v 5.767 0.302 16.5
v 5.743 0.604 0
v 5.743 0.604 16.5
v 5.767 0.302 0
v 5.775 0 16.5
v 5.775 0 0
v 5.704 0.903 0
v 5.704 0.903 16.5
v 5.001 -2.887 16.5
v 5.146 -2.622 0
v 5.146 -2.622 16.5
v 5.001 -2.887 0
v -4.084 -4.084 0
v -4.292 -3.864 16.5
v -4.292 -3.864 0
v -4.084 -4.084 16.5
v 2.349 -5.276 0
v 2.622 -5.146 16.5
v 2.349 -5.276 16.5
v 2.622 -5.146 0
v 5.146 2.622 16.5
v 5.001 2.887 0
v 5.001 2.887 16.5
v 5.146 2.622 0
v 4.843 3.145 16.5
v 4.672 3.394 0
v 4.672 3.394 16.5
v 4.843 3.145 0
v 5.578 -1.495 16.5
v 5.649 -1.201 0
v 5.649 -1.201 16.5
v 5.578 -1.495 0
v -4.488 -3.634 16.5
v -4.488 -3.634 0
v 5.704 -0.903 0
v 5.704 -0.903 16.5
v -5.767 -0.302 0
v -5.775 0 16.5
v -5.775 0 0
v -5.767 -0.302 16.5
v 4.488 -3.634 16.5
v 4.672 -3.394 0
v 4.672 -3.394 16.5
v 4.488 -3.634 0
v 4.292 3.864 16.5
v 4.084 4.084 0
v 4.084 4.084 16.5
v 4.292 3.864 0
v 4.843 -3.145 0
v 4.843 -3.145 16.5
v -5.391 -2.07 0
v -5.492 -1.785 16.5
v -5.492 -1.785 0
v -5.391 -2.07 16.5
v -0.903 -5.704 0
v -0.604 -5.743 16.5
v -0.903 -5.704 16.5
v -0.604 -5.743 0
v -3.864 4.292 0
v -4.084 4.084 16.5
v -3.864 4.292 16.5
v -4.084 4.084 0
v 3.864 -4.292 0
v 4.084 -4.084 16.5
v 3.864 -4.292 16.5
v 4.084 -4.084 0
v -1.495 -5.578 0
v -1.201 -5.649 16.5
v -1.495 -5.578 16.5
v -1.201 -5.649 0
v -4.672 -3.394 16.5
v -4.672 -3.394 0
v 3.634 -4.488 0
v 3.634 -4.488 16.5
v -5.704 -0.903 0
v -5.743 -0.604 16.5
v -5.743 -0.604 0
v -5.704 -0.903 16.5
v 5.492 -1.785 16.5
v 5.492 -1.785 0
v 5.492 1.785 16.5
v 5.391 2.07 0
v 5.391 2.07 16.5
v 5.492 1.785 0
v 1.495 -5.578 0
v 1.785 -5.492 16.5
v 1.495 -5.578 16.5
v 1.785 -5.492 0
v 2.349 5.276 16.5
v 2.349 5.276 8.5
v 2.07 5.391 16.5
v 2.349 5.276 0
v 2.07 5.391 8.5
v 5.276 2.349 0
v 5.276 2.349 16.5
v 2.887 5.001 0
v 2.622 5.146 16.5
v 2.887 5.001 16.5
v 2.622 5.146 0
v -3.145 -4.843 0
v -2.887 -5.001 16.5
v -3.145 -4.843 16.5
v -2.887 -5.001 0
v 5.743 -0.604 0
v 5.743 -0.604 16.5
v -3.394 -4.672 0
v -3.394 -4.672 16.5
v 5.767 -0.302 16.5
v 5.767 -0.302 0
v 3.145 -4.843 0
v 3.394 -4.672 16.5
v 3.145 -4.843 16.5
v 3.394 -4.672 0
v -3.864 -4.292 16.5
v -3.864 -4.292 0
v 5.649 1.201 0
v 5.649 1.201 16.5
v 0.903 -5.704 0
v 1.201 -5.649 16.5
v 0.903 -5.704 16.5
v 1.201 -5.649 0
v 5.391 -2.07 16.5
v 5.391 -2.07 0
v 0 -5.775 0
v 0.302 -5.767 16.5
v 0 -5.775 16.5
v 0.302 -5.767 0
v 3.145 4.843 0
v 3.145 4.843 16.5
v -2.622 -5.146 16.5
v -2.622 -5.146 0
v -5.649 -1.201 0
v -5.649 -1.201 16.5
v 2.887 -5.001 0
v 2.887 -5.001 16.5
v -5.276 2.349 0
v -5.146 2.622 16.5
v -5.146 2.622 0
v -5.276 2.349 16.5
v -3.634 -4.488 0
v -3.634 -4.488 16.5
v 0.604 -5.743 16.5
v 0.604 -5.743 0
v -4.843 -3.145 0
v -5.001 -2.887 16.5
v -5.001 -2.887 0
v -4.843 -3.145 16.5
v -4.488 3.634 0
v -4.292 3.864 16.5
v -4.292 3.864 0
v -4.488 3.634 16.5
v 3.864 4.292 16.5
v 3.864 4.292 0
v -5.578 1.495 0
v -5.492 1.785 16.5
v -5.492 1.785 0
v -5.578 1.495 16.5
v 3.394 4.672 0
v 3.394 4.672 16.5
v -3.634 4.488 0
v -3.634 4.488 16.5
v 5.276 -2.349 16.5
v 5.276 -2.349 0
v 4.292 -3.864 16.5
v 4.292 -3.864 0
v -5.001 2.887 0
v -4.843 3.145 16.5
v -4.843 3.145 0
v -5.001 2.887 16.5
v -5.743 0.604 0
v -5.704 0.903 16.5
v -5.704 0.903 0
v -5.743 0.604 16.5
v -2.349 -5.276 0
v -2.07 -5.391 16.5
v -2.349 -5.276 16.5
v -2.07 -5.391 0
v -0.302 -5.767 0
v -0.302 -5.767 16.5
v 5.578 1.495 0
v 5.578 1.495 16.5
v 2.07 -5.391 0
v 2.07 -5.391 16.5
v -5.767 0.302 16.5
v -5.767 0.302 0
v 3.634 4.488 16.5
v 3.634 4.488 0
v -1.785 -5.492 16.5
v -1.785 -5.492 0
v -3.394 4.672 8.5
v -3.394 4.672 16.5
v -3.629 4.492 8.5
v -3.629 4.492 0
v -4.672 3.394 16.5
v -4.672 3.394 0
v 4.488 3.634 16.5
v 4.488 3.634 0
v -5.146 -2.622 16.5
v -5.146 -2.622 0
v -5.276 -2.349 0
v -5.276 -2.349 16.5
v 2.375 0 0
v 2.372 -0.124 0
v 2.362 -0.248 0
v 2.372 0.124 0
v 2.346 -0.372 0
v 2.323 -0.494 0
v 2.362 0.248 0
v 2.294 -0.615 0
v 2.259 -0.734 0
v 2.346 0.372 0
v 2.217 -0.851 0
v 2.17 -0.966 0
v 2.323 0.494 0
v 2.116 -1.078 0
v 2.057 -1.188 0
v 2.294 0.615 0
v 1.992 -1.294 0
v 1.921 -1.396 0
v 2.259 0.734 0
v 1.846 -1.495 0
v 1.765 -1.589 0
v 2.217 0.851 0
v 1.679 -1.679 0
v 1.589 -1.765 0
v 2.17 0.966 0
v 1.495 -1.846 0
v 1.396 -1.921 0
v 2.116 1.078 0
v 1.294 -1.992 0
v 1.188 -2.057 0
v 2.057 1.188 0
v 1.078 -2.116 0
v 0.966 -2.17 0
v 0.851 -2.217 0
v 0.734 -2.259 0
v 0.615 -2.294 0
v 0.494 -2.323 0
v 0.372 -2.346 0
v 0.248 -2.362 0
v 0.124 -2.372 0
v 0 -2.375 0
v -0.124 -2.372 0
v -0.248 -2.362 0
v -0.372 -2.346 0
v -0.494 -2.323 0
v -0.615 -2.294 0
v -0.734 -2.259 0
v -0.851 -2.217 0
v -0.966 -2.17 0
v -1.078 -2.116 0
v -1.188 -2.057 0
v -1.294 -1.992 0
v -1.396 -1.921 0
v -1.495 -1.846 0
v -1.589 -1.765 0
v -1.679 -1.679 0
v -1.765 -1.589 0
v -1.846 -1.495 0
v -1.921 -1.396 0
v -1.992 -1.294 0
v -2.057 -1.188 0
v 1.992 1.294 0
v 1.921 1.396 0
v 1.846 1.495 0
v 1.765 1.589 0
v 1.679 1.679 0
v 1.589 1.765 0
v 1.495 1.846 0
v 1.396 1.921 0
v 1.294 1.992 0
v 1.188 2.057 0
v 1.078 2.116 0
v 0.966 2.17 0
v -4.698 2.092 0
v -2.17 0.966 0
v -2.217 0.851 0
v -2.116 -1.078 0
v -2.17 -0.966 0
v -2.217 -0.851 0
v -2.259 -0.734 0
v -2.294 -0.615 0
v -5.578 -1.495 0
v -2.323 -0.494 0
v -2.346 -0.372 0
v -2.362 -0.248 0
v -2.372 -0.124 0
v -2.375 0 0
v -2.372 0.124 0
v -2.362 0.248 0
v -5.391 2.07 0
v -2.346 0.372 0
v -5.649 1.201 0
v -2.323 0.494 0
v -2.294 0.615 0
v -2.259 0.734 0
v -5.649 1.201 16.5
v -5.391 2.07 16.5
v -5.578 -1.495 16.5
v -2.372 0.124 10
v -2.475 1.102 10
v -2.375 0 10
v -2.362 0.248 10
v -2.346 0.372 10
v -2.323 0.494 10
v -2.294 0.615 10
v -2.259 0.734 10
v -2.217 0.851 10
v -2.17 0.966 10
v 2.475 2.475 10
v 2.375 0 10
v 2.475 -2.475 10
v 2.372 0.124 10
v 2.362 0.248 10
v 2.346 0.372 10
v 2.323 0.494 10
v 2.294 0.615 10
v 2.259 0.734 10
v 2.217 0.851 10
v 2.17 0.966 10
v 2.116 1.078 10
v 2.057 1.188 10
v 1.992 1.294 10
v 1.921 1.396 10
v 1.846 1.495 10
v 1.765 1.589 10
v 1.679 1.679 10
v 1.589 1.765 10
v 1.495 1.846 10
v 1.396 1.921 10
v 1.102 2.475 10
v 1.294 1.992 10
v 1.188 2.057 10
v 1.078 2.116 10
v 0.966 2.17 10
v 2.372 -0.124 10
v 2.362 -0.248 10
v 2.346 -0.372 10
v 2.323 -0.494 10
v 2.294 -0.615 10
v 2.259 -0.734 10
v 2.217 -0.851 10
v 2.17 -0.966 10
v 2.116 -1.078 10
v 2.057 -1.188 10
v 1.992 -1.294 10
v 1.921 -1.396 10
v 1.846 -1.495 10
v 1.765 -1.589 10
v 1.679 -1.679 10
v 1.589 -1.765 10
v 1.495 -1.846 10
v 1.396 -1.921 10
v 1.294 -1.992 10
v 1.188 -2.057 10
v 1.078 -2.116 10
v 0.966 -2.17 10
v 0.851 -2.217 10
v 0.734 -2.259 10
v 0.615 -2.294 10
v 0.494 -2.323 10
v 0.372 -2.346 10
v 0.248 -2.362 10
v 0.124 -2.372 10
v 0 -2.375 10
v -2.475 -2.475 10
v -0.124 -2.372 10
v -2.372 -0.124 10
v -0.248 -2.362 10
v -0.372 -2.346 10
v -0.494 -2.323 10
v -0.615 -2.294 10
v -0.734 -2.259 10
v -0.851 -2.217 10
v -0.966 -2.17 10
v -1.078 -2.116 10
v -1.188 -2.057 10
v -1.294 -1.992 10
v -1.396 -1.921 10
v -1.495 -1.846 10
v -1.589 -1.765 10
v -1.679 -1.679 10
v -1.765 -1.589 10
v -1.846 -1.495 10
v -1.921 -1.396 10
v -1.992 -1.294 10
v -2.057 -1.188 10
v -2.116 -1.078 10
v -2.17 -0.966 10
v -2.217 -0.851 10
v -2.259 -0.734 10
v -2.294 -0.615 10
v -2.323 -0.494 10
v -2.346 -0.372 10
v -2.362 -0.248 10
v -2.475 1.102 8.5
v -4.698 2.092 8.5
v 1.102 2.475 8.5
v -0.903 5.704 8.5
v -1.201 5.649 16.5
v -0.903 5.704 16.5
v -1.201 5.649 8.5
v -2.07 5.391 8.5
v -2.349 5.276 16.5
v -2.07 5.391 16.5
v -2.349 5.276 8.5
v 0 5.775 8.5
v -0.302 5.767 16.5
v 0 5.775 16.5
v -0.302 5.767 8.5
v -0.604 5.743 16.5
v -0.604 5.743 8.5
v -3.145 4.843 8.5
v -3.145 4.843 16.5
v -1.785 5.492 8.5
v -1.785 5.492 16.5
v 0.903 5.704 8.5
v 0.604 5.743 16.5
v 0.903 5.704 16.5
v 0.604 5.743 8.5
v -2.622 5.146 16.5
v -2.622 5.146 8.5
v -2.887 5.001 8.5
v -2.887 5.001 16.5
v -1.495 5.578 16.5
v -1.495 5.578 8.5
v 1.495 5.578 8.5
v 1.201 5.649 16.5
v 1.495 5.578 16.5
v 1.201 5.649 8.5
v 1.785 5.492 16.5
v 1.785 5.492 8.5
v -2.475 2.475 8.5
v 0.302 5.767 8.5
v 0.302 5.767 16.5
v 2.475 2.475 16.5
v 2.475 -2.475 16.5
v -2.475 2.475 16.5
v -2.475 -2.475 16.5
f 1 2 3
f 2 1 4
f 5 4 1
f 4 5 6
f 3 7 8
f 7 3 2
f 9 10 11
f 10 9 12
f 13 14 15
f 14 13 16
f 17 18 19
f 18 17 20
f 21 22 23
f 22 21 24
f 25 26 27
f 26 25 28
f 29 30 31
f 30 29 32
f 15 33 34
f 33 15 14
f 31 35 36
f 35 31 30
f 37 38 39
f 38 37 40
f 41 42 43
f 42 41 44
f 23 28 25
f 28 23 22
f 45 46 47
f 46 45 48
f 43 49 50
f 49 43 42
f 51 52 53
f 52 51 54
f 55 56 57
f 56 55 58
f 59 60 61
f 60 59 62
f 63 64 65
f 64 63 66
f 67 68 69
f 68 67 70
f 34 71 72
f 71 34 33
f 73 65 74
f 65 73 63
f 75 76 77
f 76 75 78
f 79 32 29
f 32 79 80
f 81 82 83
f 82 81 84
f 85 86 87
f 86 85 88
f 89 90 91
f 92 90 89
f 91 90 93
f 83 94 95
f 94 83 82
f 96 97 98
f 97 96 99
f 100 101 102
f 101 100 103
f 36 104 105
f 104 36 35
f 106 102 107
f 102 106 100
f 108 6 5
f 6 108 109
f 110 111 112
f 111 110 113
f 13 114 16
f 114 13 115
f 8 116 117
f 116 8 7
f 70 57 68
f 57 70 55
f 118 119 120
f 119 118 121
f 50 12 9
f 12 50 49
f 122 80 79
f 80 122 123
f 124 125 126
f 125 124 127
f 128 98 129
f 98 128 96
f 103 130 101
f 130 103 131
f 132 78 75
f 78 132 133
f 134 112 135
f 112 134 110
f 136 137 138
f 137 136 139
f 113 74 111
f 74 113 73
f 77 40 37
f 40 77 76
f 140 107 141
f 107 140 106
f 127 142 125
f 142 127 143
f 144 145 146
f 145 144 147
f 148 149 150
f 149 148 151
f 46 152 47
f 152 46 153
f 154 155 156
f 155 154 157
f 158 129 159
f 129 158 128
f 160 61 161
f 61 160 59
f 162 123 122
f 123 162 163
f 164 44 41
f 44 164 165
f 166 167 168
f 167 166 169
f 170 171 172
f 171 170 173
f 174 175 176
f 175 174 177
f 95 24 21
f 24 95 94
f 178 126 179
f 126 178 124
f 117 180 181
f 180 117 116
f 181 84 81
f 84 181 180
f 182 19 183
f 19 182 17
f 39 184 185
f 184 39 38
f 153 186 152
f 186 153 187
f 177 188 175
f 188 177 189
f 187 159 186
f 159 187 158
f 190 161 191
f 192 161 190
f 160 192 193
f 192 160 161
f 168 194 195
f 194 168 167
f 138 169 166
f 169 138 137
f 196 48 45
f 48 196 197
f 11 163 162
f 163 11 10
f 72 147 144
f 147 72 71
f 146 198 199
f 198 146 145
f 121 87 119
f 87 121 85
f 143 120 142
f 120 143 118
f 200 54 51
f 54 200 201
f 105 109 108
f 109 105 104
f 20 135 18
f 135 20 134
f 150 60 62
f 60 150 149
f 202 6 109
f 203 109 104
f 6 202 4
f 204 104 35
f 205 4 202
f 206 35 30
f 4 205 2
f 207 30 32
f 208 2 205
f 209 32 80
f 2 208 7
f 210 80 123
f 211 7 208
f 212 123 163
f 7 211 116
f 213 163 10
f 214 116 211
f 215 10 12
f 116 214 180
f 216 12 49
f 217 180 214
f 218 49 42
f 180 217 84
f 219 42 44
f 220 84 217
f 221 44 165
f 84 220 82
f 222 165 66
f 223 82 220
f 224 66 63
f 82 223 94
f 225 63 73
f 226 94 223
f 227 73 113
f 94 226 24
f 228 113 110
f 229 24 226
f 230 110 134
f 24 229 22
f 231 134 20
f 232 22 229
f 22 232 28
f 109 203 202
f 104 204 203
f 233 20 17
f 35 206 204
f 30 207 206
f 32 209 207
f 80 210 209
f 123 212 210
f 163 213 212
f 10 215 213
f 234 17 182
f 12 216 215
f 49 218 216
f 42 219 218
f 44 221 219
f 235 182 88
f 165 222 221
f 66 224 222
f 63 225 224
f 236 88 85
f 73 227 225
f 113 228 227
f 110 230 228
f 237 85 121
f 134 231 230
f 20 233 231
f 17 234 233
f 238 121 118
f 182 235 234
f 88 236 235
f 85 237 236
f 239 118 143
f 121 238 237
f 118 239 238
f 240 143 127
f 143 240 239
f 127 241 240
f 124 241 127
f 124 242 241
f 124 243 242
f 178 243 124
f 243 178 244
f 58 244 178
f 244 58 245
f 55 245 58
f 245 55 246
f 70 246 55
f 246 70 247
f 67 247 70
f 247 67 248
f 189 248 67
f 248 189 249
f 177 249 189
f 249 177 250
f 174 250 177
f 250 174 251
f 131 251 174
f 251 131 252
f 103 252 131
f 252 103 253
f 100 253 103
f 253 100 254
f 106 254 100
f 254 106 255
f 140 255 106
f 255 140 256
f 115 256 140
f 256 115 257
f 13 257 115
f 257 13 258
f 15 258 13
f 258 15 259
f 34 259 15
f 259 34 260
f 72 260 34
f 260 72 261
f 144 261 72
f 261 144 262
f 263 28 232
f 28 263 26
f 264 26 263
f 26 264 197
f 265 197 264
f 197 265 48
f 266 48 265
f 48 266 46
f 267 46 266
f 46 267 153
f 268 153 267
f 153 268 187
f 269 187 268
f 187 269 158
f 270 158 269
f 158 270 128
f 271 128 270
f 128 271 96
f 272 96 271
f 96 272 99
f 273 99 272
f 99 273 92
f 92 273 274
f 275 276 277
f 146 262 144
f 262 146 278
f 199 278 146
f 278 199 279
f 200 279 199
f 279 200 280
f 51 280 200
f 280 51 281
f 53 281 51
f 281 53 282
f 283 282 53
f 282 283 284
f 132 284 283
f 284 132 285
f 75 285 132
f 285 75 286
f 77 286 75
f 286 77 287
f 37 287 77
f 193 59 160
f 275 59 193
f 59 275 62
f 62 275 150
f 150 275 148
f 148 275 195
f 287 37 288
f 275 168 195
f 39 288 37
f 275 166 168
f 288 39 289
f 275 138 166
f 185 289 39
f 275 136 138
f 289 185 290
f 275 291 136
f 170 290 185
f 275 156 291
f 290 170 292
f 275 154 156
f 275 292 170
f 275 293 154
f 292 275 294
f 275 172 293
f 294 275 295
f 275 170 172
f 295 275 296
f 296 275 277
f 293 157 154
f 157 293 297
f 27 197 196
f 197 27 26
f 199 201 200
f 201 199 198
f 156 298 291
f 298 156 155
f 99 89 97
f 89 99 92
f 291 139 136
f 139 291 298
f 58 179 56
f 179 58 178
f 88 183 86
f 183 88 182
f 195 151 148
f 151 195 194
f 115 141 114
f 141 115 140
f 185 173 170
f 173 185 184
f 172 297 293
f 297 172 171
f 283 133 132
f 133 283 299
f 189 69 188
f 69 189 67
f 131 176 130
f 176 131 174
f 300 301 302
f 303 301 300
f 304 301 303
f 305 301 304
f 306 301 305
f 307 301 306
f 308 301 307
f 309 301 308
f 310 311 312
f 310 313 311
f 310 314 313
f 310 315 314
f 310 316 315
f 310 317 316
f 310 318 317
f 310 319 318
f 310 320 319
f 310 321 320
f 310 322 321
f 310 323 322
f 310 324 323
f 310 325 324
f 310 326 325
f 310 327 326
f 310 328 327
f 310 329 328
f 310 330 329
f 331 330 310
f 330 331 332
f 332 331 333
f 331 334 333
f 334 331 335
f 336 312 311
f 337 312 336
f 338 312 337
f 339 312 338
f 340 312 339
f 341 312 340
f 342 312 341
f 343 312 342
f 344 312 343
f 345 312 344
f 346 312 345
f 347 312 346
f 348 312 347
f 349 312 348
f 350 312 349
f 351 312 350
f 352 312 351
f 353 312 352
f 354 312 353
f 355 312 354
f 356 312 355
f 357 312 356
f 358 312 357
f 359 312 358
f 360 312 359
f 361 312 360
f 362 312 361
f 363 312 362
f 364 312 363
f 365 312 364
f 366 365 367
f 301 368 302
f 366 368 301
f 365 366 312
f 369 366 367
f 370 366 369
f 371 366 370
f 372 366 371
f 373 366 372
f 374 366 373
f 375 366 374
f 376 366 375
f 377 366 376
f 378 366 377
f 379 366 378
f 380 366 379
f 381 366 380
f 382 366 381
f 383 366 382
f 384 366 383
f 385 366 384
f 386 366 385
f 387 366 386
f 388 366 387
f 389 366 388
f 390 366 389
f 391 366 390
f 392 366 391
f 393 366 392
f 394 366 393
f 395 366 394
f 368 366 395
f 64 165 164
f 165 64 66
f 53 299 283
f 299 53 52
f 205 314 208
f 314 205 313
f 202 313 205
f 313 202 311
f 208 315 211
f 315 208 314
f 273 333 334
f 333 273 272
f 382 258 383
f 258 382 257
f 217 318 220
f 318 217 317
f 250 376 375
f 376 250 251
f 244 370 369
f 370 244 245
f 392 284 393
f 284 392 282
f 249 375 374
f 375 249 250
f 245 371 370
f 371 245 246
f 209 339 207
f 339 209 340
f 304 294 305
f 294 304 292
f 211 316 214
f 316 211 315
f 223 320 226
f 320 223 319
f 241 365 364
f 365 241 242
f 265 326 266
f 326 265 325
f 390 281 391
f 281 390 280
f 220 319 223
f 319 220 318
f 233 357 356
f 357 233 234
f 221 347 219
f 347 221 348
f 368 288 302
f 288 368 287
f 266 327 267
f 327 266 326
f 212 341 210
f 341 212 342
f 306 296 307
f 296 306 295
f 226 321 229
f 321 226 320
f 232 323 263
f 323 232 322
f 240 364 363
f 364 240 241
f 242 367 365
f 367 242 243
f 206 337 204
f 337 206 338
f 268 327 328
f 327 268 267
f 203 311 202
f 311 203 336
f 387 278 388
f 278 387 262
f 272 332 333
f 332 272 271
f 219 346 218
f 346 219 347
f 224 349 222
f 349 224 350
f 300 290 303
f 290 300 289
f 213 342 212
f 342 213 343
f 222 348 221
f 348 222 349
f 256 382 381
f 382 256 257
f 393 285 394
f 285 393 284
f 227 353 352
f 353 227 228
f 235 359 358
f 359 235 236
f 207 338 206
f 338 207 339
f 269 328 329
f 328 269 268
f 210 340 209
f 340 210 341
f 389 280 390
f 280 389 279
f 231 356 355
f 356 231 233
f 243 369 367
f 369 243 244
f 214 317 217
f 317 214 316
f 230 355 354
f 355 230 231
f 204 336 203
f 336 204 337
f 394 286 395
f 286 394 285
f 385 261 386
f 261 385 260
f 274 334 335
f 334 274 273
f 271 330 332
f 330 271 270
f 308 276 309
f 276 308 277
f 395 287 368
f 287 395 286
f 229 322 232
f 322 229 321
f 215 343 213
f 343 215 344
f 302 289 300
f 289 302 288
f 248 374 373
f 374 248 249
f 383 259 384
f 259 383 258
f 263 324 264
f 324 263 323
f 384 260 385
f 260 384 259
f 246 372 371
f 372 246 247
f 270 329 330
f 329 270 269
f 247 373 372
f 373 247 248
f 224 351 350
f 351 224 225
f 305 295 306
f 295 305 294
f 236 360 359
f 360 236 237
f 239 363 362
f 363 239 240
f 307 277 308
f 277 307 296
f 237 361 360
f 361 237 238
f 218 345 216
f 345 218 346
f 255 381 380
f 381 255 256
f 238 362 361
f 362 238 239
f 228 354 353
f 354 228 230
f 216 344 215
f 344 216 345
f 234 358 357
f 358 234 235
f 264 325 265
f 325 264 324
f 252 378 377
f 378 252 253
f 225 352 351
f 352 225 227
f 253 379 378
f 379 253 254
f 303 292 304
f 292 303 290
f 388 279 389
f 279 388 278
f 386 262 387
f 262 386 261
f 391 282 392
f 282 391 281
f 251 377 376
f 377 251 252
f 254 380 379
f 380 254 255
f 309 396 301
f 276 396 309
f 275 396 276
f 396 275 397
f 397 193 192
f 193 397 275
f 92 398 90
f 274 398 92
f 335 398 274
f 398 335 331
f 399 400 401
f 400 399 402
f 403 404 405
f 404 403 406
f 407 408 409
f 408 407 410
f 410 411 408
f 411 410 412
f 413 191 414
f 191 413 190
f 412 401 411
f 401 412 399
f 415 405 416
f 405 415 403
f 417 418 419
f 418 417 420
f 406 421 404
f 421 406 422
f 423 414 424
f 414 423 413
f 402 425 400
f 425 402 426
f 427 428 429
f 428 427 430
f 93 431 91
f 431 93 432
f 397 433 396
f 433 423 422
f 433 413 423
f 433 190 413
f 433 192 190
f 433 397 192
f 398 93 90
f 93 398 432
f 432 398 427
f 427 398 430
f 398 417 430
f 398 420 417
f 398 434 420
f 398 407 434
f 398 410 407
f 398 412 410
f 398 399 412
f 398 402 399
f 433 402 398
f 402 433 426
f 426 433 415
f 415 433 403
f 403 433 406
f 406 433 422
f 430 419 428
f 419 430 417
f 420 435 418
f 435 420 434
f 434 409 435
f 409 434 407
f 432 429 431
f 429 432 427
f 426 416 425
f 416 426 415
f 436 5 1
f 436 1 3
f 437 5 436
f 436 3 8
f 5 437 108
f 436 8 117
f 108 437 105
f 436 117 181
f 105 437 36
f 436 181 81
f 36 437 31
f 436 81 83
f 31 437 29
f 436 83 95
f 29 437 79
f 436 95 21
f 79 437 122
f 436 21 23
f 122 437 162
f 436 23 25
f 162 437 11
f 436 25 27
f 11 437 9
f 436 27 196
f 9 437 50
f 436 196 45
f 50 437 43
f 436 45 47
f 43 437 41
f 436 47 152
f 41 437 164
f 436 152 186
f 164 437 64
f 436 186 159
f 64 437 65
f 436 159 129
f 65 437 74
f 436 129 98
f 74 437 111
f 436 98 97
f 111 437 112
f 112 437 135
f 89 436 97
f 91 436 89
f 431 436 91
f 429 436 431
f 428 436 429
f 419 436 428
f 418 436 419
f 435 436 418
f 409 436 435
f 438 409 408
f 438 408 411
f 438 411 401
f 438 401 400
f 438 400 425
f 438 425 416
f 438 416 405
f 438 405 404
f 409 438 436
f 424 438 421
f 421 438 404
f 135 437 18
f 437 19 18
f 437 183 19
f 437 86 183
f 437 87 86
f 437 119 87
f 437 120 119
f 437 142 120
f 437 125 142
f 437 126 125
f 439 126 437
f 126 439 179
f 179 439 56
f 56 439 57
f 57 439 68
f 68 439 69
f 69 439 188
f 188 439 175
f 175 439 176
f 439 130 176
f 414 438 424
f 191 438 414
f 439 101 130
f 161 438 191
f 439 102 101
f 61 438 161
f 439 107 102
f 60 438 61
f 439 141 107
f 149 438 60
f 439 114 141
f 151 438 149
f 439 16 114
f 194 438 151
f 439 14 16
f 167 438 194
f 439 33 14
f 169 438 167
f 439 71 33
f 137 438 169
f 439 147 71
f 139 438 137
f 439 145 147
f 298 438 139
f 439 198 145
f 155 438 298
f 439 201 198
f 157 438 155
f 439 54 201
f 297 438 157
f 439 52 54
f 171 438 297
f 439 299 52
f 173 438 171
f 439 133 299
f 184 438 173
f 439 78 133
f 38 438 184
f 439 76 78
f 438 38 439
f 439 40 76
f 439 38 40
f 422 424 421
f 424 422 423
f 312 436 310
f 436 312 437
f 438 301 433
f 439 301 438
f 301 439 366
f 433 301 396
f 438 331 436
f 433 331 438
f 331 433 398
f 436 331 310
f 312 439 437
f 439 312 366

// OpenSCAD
// LEGO-Kreuzachsen-Adapter für Servo / Schrittmotor / TT-Motor
// Parametrisch: Klemmring (geschlitzt) + Vierkant-Stecksockel für LEGO-Technic-Achse
//
// Benutzung: part wählen, in OpenSCAD F5 (Vorschau) / F6 (Rendern) und als STL exportieren.
// Die STLs im Ordner wurden mit tools/make_parts.py erzeugt und sind geometrisch identisch.

part = "sg90";   // "sg90" | "byj48" | "tt"

//         [Bohrung, Wandstärke, Ringhöhe]  mm
params = [
  ["sg90",  [4.75, 3.40, 10.0]],   // SG90 20T-Spline, ~4,85 mm
  ["byj48", [4.90, 3.40, 11.0]],   // 28BYJ-48, 5-mm-Welle mit Fläche
  ["tt",    [2.90, 4.50,  9.0]]    // TT-Motor, 3-mm-D-Welle
];

function pick(name) = [for (p = params) if (p[0] == name) p[1]][0];

bore    = pick(part)[0];
wall    = pick(part)[1];
ring_h  = pick(part)[2];

sock    = 4.95;   // LEGO-Kreuzachse: 4,8 mm über Kreuz, 4,9 mm Bohrung im Stein
sock_h  = 8.0;
gap_deg = 48;     // Schlitzwinkel des Klemmrings
$fn     = 120;

ro = bore / 2 + wall;

module clamp_ring() {
    difference() {
        cylinder(h = ring_h, r = ro);
        translate([0, 0, -1]) cylinder(h = ring_h + 2, r = bore / 2);
        // Schlitz: Keil nach +Y, Breite über den Winkel
        translate([0, 0, -1]) rotate([0, 0, 90 - gap_deg / 2])
            cube([ro * 2, ro * 2 * sin(gap_deg / 2) / cos(gap_deg / 2), ring_h + 2]);
    }
}

module axle_socket() {
    translate([0, 0, ring_h - 1.5])
        difference() {
            cylinder(h = sock_h, r = ro);
            translate([-sock / 2, -sock / 2, -1]) cube([sock, sock, sock_h + 2]);
        }
}

module adapter() {
    union() {
        clamp_ring();
        axle_socket();
    }
}

adapter();
